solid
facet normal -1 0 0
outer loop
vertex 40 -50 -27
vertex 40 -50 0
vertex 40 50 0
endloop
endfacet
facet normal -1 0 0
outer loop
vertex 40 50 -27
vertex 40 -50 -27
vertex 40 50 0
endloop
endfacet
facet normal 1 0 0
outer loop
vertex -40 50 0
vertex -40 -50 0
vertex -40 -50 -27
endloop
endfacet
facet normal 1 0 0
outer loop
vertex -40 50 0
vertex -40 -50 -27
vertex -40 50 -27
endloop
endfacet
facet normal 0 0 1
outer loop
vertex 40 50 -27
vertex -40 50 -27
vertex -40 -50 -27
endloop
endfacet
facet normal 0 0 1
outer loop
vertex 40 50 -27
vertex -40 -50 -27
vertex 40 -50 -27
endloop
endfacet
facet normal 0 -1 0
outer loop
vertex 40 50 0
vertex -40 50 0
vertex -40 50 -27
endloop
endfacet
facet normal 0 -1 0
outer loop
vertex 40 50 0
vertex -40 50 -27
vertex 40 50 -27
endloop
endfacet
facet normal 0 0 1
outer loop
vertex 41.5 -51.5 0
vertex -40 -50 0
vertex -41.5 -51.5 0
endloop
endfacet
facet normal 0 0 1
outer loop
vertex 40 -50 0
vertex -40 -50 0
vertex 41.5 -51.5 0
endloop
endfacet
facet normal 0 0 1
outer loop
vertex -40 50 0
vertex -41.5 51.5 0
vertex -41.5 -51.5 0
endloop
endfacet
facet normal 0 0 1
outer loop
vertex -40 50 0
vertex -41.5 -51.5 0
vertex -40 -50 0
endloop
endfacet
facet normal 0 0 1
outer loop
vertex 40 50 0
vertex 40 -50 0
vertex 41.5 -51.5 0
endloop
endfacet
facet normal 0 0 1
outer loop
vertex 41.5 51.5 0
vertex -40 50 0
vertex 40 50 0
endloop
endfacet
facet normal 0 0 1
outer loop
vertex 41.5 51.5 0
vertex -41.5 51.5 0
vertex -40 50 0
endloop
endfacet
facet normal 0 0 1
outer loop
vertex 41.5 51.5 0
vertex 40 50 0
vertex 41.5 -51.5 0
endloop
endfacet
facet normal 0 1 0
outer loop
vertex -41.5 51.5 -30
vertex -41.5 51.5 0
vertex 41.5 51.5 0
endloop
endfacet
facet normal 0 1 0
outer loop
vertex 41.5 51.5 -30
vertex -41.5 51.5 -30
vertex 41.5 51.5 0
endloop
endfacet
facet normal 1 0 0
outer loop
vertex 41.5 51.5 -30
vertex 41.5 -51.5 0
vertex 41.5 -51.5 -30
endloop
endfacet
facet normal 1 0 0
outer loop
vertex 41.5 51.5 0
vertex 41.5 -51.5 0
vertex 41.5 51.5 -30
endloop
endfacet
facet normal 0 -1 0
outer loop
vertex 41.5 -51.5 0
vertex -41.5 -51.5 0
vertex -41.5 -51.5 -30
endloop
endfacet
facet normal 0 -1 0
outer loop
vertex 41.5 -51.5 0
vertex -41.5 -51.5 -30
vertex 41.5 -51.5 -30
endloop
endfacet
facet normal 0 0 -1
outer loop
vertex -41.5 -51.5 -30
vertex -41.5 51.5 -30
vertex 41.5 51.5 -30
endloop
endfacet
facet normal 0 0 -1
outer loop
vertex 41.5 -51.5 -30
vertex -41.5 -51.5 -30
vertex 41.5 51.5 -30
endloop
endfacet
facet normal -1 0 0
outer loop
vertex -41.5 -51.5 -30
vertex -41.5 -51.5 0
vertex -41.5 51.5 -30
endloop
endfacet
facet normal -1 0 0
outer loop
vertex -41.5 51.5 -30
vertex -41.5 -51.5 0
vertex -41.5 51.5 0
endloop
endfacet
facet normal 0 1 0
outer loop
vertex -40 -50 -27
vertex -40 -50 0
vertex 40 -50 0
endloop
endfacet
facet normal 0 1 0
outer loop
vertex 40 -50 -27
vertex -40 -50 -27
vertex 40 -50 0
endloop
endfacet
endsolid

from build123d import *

# Parameters (mm, degrees)
F0_W     = 83
F0_H     = 103
F1_DEPTH = 30
F2_W     = 80
F2_H     = 100
F3_DEPTH = 27


with BuildPart() as f1:
    # F0 (on Top) → F1 (new body)
    with BuildSketch(Plane.XY):
        Rectangle(F0_W, F0_H)
    extrude(amount=-F1_DEPTH)

    # F2 (on Top) → F3 (cut)
    with BuildSketch(Plane.XY):
        Rectangle(F2_W, F2_H)
    extrude(amount=-F3_DEPTH, mode=Mode.SUBTRACT)


solid = f1.part
